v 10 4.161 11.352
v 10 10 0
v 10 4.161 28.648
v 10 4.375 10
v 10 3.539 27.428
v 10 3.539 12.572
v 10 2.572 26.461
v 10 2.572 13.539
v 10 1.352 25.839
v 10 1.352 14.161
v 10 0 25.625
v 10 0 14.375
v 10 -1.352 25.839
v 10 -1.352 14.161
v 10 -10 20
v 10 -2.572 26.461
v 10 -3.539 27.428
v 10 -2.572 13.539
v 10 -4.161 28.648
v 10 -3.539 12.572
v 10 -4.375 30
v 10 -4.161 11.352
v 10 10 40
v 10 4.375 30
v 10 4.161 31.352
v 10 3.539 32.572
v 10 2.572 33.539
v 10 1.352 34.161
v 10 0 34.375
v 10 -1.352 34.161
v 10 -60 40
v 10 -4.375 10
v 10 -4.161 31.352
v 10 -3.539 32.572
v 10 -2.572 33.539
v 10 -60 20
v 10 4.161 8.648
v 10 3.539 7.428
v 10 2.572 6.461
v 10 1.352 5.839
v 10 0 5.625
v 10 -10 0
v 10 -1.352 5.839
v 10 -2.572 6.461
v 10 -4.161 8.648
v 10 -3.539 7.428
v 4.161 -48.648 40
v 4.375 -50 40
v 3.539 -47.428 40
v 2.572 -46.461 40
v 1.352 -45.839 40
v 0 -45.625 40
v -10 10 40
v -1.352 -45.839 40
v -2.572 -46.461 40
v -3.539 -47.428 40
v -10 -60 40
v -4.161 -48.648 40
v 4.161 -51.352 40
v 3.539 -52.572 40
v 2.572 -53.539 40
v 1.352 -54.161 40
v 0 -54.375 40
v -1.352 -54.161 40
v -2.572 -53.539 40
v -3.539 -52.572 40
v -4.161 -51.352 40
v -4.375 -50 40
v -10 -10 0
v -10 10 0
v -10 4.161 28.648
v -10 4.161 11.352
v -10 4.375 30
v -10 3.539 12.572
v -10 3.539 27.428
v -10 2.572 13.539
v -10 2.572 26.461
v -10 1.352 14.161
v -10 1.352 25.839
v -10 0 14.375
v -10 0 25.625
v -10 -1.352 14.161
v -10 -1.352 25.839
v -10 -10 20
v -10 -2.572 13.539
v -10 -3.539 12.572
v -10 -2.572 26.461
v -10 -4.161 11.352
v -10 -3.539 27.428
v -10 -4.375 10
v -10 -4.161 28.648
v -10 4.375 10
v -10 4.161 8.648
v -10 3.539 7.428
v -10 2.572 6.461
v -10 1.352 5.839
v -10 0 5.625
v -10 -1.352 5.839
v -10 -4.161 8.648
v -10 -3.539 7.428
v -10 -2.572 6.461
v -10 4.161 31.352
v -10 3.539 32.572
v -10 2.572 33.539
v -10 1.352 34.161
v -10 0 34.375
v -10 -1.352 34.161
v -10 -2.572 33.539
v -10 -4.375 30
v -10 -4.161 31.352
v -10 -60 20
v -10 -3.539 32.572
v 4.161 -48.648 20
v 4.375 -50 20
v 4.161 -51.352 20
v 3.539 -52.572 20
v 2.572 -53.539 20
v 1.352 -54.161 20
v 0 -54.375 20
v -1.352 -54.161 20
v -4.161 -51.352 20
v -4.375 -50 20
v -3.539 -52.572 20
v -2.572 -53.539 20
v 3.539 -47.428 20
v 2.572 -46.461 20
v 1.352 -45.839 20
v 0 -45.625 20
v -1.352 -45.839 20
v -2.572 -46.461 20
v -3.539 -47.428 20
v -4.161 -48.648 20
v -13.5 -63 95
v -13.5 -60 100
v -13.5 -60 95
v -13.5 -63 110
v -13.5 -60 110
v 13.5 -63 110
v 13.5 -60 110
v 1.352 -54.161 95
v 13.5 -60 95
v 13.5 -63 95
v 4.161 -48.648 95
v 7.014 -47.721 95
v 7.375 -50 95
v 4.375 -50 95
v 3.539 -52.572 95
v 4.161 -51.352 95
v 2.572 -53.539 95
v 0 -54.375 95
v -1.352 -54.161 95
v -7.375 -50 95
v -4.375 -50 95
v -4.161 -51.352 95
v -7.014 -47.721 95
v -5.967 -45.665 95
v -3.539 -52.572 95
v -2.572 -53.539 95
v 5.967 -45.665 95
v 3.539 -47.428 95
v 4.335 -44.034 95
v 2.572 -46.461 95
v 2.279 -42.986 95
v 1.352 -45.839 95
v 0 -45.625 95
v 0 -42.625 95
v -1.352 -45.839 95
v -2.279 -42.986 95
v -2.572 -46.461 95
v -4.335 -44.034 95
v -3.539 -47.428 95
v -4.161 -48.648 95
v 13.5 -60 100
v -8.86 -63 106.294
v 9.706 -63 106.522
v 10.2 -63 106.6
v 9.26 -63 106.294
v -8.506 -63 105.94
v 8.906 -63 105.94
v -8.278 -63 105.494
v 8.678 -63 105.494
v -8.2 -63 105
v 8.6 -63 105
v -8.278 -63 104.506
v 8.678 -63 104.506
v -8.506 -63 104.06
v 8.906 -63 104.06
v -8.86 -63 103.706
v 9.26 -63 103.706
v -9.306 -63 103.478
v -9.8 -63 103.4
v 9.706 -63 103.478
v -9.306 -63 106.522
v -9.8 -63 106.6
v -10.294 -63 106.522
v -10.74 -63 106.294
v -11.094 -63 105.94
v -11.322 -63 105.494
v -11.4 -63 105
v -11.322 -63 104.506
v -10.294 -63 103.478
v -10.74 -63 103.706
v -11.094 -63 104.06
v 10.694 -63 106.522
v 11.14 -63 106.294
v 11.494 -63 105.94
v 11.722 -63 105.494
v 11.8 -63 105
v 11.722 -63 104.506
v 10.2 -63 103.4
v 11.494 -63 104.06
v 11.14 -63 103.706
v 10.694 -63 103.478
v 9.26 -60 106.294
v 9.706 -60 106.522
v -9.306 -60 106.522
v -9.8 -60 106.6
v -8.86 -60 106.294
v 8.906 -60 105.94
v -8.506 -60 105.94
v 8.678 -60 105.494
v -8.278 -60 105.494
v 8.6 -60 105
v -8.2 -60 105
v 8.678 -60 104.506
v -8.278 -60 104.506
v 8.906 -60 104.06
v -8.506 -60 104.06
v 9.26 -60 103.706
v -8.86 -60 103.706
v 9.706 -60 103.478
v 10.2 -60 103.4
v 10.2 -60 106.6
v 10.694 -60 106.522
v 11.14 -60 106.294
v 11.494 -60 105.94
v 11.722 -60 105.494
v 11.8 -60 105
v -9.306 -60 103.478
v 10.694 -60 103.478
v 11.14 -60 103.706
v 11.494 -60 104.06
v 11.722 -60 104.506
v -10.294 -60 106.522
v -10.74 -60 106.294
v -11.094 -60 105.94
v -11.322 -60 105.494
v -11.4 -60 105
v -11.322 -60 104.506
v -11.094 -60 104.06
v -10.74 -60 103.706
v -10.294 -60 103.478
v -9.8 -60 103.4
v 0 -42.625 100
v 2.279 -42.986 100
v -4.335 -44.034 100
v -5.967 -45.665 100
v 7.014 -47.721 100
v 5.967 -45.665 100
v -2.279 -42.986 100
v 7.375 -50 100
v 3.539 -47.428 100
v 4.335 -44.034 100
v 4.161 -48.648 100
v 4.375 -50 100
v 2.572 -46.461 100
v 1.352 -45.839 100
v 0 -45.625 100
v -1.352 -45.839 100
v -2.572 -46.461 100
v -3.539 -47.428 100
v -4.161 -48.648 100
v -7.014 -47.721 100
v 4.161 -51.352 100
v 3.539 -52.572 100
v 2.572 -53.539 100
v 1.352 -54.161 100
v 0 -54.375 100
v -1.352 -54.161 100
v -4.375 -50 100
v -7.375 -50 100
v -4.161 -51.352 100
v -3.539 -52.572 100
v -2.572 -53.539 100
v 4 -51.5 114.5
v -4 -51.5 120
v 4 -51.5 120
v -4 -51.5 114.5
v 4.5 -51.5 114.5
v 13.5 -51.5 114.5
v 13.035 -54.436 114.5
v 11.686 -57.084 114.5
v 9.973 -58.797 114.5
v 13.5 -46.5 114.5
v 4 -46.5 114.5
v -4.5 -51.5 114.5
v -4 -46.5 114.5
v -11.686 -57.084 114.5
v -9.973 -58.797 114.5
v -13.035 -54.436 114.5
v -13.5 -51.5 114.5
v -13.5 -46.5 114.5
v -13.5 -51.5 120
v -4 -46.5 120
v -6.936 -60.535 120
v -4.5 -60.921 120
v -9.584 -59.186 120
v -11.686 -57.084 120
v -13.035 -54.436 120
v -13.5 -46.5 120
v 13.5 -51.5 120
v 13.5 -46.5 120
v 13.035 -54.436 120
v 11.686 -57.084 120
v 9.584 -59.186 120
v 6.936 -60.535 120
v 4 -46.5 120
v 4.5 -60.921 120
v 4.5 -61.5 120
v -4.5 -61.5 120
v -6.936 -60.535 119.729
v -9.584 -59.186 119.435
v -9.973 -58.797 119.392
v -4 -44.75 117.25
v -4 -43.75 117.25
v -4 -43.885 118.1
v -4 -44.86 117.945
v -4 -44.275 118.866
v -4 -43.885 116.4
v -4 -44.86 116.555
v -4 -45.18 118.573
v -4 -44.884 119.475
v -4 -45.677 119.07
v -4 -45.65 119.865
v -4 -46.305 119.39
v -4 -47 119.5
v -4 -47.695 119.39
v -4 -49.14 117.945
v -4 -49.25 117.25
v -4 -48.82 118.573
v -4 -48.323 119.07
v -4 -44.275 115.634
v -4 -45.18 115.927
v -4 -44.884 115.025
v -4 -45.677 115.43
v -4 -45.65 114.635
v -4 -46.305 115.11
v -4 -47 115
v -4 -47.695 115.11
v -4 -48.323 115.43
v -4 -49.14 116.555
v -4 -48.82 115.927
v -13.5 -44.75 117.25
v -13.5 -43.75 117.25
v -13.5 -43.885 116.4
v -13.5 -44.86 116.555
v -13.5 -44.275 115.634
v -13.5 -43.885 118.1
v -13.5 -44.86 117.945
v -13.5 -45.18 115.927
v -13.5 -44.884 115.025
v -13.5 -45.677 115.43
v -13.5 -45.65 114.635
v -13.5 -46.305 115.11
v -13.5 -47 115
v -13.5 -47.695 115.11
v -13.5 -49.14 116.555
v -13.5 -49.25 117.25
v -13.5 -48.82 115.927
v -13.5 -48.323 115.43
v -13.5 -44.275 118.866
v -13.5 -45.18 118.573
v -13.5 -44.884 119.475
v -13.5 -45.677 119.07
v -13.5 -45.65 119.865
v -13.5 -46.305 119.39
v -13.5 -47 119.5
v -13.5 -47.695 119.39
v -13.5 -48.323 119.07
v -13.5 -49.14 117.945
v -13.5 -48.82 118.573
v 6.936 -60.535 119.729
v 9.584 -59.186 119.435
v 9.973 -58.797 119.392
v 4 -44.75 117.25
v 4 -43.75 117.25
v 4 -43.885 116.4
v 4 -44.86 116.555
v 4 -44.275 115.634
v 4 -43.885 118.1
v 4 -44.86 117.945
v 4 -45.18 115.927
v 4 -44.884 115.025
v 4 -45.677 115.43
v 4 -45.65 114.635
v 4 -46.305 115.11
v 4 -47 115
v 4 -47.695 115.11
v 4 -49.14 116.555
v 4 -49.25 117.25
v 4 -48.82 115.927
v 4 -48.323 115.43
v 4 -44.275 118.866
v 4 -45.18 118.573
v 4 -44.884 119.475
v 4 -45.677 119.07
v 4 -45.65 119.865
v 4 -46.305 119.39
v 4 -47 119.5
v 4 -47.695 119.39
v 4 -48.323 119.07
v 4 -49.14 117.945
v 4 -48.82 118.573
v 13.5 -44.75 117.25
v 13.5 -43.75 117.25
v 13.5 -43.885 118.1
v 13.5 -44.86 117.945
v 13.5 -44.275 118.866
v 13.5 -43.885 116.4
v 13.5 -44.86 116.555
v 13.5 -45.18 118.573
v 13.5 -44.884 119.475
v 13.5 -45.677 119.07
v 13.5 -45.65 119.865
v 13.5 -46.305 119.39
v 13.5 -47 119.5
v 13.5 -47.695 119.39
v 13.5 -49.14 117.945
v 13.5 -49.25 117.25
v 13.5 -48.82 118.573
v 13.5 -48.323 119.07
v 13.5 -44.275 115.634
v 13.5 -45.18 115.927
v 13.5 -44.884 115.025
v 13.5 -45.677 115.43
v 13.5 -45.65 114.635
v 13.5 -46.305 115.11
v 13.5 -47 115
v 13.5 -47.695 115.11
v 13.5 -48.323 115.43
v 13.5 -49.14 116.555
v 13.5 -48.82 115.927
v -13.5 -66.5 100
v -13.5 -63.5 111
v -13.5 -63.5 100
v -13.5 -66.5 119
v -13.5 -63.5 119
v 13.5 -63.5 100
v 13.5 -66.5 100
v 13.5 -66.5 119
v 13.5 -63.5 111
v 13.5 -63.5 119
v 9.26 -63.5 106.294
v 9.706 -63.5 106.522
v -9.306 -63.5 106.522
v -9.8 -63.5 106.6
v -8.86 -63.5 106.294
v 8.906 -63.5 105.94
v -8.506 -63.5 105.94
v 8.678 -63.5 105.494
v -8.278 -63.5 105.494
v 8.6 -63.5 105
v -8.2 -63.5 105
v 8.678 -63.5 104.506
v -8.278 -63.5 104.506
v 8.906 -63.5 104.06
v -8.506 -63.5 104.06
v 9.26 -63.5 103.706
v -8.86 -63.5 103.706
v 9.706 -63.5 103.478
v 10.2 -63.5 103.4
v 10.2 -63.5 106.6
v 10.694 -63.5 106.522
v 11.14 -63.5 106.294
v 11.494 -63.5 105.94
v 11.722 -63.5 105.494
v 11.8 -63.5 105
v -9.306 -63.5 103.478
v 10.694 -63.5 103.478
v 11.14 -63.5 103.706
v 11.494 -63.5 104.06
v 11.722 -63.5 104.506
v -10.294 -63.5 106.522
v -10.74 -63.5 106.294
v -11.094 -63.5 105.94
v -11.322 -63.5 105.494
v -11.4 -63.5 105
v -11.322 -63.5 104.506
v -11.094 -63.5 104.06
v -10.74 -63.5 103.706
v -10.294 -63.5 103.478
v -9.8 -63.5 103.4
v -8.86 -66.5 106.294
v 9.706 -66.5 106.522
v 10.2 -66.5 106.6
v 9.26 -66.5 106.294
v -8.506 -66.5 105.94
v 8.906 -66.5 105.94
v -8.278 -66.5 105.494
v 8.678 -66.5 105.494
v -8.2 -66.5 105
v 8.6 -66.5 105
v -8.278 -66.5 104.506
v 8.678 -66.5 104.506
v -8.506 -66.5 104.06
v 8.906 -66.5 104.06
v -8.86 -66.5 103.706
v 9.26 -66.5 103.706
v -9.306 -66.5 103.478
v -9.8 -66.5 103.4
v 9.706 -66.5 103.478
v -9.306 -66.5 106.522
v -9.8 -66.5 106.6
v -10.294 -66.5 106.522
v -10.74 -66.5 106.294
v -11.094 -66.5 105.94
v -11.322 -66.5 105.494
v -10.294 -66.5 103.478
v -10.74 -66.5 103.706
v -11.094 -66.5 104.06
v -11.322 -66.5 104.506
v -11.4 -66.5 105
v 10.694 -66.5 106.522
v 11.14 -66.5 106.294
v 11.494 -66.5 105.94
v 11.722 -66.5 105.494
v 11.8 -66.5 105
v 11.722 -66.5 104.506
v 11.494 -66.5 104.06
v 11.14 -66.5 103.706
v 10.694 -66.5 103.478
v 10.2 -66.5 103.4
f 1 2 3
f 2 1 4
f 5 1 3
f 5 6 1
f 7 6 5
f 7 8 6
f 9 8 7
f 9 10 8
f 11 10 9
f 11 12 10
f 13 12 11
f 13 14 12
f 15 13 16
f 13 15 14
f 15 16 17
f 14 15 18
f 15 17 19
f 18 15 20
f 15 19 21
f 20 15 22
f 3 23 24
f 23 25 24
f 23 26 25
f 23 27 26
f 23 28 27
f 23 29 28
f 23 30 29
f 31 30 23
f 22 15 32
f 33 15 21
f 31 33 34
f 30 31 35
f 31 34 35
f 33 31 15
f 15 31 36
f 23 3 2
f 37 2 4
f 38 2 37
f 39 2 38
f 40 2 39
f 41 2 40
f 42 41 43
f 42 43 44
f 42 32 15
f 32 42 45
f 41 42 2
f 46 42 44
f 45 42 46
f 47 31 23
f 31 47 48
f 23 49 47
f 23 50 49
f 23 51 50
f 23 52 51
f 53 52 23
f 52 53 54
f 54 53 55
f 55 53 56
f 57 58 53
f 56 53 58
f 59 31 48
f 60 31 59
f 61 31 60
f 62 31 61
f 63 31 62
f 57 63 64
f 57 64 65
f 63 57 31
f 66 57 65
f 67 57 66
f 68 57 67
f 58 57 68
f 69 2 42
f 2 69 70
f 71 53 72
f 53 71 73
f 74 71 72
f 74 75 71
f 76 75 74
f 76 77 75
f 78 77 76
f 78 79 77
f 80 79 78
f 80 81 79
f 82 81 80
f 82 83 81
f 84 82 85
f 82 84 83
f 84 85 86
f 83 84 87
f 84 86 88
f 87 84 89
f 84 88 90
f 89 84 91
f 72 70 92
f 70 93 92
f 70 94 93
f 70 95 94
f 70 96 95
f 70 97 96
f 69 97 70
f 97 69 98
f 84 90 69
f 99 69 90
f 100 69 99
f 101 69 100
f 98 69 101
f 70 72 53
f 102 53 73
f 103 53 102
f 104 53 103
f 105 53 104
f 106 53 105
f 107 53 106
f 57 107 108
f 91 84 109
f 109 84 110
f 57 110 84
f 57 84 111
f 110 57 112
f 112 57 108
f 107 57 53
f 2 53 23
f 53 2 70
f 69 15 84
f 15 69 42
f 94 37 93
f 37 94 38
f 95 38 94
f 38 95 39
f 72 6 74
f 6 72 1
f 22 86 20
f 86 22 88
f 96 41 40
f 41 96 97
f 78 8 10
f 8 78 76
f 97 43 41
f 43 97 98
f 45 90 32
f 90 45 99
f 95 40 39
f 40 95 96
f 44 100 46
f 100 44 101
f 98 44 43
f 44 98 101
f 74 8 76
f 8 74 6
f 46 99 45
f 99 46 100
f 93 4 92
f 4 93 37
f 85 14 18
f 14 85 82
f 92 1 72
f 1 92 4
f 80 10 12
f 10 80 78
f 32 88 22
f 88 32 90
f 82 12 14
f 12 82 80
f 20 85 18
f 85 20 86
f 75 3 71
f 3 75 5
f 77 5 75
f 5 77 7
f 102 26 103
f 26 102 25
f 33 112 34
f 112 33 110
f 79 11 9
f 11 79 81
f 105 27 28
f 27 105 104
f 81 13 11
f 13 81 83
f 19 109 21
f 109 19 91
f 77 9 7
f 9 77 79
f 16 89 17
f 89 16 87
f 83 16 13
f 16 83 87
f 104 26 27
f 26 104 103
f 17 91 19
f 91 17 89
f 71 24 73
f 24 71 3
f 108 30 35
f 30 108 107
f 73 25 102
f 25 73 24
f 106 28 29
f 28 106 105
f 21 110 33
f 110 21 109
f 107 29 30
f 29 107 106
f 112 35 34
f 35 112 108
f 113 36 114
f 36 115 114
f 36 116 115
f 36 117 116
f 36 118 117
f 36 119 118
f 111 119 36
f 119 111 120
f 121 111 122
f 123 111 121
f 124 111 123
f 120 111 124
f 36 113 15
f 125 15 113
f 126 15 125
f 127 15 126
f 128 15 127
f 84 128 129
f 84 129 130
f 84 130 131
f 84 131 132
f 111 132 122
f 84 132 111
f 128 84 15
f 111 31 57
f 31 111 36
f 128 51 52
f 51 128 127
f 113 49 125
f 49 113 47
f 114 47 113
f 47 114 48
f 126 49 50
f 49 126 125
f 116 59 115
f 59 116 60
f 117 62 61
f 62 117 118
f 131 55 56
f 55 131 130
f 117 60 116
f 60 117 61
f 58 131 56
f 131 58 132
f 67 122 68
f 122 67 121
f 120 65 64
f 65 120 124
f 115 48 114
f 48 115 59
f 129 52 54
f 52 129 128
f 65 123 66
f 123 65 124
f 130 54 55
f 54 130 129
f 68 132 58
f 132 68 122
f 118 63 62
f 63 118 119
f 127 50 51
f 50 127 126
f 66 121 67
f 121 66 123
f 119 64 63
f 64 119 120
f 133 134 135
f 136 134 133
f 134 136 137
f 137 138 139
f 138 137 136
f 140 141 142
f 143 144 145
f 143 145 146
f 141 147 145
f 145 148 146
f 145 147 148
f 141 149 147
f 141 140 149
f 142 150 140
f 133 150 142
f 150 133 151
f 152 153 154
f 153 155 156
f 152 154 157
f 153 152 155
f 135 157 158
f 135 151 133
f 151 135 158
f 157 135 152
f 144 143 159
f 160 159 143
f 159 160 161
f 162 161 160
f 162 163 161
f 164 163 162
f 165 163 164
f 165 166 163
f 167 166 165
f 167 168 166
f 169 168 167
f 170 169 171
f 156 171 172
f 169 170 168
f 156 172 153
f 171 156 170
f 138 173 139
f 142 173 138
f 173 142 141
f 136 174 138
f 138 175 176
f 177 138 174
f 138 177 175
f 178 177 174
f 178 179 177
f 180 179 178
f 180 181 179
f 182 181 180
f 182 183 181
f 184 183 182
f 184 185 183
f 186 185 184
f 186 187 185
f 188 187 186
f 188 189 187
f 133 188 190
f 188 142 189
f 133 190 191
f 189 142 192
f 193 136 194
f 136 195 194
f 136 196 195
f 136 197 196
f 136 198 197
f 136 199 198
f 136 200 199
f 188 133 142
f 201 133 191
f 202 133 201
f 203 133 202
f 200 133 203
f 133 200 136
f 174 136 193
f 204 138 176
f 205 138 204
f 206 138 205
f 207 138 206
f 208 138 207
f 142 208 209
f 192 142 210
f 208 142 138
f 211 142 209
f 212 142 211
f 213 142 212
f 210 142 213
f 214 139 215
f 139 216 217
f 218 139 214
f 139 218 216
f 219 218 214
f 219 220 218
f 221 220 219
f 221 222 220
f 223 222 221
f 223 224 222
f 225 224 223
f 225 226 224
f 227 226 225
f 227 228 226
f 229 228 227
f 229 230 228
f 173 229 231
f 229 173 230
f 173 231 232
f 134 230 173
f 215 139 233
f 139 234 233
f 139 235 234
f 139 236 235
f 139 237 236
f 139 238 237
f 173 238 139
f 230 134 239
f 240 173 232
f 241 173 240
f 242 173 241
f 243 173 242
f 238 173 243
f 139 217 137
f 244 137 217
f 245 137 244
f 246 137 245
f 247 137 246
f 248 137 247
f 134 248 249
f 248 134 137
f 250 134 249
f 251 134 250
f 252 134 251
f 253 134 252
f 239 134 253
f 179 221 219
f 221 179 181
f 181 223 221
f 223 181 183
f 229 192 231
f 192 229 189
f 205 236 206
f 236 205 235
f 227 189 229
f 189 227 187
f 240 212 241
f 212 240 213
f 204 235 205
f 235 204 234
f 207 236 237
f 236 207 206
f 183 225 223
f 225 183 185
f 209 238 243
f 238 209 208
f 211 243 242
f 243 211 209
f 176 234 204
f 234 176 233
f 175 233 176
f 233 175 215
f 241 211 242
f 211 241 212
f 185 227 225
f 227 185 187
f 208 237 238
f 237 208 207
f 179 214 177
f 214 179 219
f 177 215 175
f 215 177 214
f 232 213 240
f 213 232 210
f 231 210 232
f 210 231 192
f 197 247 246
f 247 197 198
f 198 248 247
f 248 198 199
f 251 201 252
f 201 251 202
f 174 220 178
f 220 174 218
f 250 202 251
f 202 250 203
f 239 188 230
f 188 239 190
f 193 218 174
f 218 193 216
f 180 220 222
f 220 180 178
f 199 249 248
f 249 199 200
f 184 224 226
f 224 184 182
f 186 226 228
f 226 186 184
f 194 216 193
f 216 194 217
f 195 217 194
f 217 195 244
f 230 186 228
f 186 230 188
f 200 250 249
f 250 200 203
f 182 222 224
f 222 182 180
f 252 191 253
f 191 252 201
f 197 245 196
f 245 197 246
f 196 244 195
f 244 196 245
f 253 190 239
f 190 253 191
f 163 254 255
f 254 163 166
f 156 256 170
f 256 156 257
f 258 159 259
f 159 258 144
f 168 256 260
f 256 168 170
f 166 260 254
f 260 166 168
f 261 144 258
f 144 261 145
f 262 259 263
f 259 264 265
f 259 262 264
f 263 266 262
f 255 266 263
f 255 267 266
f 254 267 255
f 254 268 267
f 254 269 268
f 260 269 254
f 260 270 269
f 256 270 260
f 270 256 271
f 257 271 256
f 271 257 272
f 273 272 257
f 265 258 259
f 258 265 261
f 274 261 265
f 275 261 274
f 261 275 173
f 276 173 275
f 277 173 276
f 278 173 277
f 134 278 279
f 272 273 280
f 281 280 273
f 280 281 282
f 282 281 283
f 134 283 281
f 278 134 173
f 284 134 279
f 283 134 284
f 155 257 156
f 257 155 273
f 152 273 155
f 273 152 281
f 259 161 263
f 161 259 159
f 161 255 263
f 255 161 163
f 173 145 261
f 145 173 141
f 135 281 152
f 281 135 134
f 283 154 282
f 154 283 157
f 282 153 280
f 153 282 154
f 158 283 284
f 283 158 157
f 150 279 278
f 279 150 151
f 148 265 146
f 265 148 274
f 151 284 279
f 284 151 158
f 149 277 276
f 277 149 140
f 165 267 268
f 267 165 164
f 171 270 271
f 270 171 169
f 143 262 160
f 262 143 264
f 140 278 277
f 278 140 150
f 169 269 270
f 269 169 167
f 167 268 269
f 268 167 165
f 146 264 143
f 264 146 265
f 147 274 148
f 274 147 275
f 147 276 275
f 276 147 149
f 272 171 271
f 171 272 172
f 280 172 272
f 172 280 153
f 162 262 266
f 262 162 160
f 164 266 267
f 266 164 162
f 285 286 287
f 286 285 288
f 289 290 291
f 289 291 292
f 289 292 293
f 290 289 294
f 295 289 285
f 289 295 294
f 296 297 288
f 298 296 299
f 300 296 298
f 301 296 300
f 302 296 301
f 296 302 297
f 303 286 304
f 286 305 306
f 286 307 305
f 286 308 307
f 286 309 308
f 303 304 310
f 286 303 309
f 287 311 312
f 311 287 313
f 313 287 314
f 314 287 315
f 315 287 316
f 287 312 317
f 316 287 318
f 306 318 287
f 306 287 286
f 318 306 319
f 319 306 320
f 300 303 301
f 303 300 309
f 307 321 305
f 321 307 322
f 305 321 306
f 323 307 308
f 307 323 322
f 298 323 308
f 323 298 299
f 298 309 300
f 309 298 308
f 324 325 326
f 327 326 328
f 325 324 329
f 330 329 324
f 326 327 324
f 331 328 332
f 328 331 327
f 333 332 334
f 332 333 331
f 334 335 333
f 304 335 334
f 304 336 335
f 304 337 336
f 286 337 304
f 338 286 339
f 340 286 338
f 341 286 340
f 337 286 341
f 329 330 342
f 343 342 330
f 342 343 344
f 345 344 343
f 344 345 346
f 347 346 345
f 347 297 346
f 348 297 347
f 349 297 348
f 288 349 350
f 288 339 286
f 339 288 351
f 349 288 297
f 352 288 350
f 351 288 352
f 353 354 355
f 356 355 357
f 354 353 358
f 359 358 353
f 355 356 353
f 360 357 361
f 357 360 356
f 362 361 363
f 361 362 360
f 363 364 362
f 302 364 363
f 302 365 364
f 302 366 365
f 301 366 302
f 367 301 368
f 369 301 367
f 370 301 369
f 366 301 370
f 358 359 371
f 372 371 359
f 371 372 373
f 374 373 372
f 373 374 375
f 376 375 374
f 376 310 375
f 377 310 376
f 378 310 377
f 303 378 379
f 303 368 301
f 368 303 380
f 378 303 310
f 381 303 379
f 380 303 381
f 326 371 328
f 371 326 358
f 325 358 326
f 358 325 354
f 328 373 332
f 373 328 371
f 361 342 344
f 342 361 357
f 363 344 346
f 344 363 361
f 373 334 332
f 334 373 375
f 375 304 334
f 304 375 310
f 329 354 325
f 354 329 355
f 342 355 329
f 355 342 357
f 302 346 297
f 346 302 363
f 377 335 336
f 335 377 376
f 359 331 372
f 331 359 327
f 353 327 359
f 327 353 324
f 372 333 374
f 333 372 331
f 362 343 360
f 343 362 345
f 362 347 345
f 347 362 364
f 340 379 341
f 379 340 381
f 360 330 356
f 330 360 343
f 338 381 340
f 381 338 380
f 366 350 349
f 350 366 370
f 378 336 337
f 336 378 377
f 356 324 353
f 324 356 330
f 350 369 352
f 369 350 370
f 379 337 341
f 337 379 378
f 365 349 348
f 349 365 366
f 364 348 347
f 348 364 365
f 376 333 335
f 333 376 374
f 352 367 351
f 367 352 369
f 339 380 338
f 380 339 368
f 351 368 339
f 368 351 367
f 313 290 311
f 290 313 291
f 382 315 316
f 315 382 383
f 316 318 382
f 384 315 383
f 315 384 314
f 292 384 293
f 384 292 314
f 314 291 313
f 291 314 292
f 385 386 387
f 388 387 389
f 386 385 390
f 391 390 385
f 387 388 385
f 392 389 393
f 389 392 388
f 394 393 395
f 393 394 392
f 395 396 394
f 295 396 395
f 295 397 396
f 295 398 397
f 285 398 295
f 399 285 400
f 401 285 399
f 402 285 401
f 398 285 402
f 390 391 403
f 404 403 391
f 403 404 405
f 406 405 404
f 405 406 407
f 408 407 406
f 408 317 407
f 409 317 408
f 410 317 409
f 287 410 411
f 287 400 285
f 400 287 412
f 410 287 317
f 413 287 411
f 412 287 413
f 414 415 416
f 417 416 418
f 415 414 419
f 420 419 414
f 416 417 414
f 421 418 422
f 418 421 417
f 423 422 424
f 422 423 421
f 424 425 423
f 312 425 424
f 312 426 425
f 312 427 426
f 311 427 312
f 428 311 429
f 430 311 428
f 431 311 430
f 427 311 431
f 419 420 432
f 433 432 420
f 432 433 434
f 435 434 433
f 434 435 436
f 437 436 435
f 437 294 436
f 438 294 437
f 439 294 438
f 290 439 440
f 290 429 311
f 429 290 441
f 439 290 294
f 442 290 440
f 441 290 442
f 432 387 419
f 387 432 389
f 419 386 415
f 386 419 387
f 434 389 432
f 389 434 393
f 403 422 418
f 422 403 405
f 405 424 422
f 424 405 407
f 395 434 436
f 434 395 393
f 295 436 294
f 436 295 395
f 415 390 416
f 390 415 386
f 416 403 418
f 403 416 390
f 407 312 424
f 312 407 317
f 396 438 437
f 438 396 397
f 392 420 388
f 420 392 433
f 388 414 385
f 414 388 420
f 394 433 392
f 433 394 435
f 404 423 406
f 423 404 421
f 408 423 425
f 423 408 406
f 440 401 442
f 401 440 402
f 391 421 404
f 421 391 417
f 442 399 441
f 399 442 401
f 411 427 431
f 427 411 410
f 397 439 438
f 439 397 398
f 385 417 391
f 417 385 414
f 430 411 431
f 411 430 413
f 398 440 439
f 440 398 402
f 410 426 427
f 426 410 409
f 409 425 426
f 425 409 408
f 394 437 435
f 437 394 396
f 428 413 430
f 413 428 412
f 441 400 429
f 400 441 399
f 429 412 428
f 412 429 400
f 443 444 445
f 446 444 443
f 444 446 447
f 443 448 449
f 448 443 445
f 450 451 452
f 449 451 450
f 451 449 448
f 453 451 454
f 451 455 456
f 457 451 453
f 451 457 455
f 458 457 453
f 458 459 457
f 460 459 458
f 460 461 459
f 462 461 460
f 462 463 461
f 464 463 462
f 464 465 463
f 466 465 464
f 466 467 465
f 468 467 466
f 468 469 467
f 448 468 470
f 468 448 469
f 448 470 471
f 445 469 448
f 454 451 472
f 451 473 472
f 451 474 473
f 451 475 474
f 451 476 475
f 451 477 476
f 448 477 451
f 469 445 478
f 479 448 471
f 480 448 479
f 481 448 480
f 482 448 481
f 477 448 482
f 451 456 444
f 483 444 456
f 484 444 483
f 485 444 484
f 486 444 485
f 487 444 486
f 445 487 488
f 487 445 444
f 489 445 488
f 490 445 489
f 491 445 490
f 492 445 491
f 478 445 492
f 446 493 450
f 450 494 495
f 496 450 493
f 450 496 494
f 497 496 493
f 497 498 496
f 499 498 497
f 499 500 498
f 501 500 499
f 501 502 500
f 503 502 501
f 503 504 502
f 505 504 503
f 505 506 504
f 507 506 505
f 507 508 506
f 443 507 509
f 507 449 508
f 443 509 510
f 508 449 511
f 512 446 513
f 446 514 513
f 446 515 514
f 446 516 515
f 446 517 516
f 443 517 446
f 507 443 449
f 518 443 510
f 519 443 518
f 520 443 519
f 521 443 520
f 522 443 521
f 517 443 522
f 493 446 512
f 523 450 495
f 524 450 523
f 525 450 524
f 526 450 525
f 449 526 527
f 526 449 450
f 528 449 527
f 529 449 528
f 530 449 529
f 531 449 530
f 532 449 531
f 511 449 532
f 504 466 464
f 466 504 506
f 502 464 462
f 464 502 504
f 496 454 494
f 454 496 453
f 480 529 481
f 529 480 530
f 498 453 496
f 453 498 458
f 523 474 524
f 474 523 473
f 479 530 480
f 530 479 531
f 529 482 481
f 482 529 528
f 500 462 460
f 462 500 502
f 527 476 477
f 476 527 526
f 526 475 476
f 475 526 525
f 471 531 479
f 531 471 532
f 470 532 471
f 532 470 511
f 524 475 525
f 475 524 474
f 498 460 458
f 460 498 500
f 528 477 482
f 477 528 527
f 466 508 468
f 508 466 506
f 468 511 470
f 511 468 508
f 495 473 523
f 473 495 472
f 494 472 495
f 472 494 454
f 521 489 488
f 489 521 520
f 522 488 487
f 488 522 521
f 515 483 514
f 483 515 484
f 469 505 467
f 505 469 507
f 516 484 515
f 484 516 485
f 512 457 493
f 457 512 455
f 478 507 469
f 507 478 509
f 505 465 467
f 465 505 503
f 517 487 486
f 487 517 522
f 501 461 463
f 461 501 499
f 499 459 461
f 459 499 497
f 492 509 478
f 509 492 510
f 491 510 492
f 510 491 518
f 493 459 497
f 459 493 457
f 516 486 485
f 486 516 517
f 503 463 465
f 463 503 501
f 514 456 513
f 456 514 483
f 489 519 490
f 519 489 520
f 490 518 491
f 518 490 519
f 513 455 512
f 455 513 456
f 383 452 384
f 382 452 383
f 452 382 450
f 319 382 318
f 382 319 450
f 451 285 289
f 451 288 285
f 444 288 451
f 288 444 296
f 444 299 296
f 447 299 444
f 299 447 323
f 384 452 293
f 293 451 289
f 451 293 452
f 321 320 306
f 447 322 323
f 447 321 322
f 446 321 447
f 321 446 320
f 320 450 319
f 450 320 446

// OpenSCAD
// file: ../Webcam Holder/cam_bracket.scad
/*
 * Inspired by the "TinyBoy / Fabrikator mini Cam holder"
 * by "andy_a":
 * http://www.thingiverse.com/thing:1434698
 *
 * Created by:
 * Thomas Buck <xythobuz@xythobuz.de> in April 2016
 *
 * Licensed under the Creative Commons - Attribution - Share alike license.
 */

//import("/Users/thomas/Downloads/TinyBoy___Fabrikator_mini_Cam_holder/files/tinyboy__fabrikator_mini_cam_holder.stl");

// -----------------------------------------------------------

$fn = 20;

// -----------------------------------------------------------

module quarter_circle(d, h) {
    difference() {
        cylinder(d = d, h = h);
        
        translate([0, -(d / 2) - 1, -1])
            cube([(d / 2) + 1, d + 2, h + 2]);
        
        translate([-(d / 2) - 1, 0, -1])
            cube([(d / 2) + 2, (d / 2) + 1, h + 2]);
    }
}

module webcam_shaft_center() {
    difference() {
        cube([9.5, 3.5, 8]);
        
        translate([4.5, 4, 4])
            rotate([90, 0, 0])
            cylinder(d = 3, h = 4.5);
    }
}

module webcam_shaft_end() {
    difference() {
        union() {
            // rectangular part
            translate([0, -5.5, 0])
                cube([5, 5.5, 9.5]);
            
            // front radius
            translate([5, -2.75, 0])
                cylinder(d = 5.5, h = 9.5);
            
            translate([0, 0, 9.5])
                rotate([90, 0, 0])
                quarter_circle(19, 5.5);
        }
    
        // axis hole
        translate([4.5, -2.75, -1])
            cylinder(d = 4.5, h = 11.5);
    }
}

module webcam_shaft() {
    translate([-0.5, -5.5, 9.5])
        webcam_shaft_center();

    translate([9, 0, 0])
        webcam_shaft_end();

    translate([9, -5.5, 27])
        rotate([0, 180, 180])
        webcam_shaft_end();
}

// -----------------------------------------------------------

translate([0, 0.5, 5.5])
    rotate([90, 0, 90])
    webcam_shaft();
// file: cam-holder.scad
//import("/Users/thomas/Downloads/y-corner.stl");

// holder
edge = 20;
height = 40;
hole_off = 10;
hole_size = 8.0;
hole_wiggle = 0.75;

// adaptor
length = 50;
forw_height = 20;

// cam
cam_width = 27.0;
cam_height = 5.0;
cam_wall = 3.0;
cam_holes = 3.2;
cam_hole_off = 3.3;
cam_hole_dist = 20.0;
cam_mount_height = 15.0;
cam_mount_dist = 10.0;

mock_pole_height = 60.0 + 40;
mock_pole_off = 10.0;

$fn = 20;

module prism(l, w, h) {
    #polyhedron(
        points = [[0,0,0], [l,0,0], [l,w,0], [0,w,0], [0,w,h], [l,w,h]],
        faces = [[0,1,2,3],[5,4,3,2],[0,4,5,1],[0,3,4],[5,2,1]]
    );
}

module holder() {
    difference() {
        translate([-edge / 2, -edge / 2, 0])
            cube([edge, edge, height]);
        
        translate([-edge / 2 - 1, 0, hole_off])
            rotate([0, 90, 0])
            cylinder(d = hole_size + hole_wiggle, h = edge + 2);
        
        translate([-edge / 2 - 1, 0, height - hole_off])
            rotate([0, 90, 0])
            cylinder(d = hole_size + hole_wiggle, h = edge + 2);
    }
}

module adaptor() {
    translate([-edge / 2, -edge / 2 - length, height - forw_height])
    difference() {
        cube([edge, length, forw_height]);
        
        translate([edge / 2, hole_off, -1])
            cylinder(d = hole_size + hole_wiggle, h = forw_height + 2);
    }
}

module cam_plate() {
    difference() {
        cube([cam_width, cam_wall, cam_mount_height]);
        
        translate([cam_hole_off, cam_wall + 1, cam_mount_height - cam_height])
            rotate([90, 0, 0])
            cylinder(d = cam_holes, h = cam_wall + 2);
        
        translate([cam_hole_off + cam_hole_dist, cam_wall + 1, cam_mount_height - cam_height])
            rotate([90, 0, 0])
            cylinder(d = cam_holes, h = cam_wall + 2);
    }
}

module cam_mount() {
    translate([0, -edge / 2 - length + hole_off, height - forw_height + mock_pole_height - mock_pole_off * 2 - 40])
    rotate([0, 0, 180])
    difference() {
        union() {
            cylinder(d = hole_size + hole_wiggle + cam_wall * 2, h = cam_height);
            
            translate([-cam_width / 2, cam_mount_dist, 0])
                cam_plate();
            
            translate([-cam_width / 2 + cam_width / 2 - ((hole_size + hole_wiggle) / 2 + cam_wall), 0, 0])
                cube([cam_width - 2 * (cam_width / 2 - ((hole_size + hole_wiggle) / 2 + cam_wall)), cam_mount_dist + ((hole_size + hole_wiggle) / 2) - 2, cam_height]);
            
            translate([-(hole_size + hole_wiggle) / 2 - cam_wall, 0, 0])
                rotate([0, -90, 0])
                prism(cam_height, cam_mount_dist, cam_width / 2 - ((hole_size + hole_wiggle) / 2 + cam_wall));
            
            translate([(hole_size + hole_wiggle) / 2 + cam_wall, 0, cam_height])
                rotate([0, 90, 0])
                prism(cam_height, cam_mount_dist, cam_width / 2 - ((hole_size + hole_wiggle) / 2 + cam_wall));
        }
        
        translate([0, 0, -1])
            cylinder(d = hole_size + hole_wiggle, h = cam_height + 2);
    }
}

module cam_holder_mount() {
    holder();
    adaptor();

    %translate([0, -edge / 2 - length + hole_off, height - forw_height - mock_pole_off])
        cylinder(d = hole_size, h = mock_pole_height);

    translate([0, 0, 35])
    cam_mount();
}

cam_holder_mount();
// main file
light_height = 8;
light_wall = 3;
light_wall_add = 2;
light_dia = 150;
light_cut = 20;
lights_off = 5.8;

light_h = light_height + (2 * light_wall_add);

module lights_ring() {
    $fn = 50;
    translate([0, light_dia / 2, 0])
    difference() {
        cylinder(h = light_h, d = light_dia);
        
        translate([0, 0, -1])
            cylinder(h = light_h + 2, d = light_dia - light_wall - light_wall_add);
        
        translate([0, 0, light_wall_add])
            cylinder(h = light_height, d = light_dia - light_wall);
        
        translate([-light_dia / 2, -light_dia / 2 + light_cut, -1])
            cube([light_dia, light_dia, light_h + 2]);
    }
}

module lights_mount() {
    translate([0, -edge / 2 - length + hole_off, height - forw_height + mock_pole_height - mock_pole_off * 2 - 10])
    difference() {
        union() {
            cylinder(d = hole_size + hole_wiggle + cam_wall * 2, h = light_h);
            
            translate([0, lights_off, 0])
                lights_ring();
        }
        
        translate([0, 0, -1])
            cylinder(d = hole_size + hole_wiggle, h = light_h + 2);
    }
}

include <cam-holder.scad>
use <../Webcam Holder/cam_bracket.scad>

module fab_min_mount() {
    translate([-13.5, -60.5, 120])
    union() {
        rotate([90, 0, 90])
        webcam_shaft();
    
        translate([27, -6, -5])
        rotate([0, 180, 0])
        cam_plate();
    
        hull() {
            translate([0, -6, -9])
            cube([27, 3, 8]);
            translate([9, -1, -5.5])
            cube([9, 10, 5.5]);
        }
    }
}

//translate([0, 0, -15])
//lights_mount();

// for use with orangepi cam you just need this
//cam_holder_mount();

// orangepi cam
//use <opi-cam-mount.scad>
//color("white")
//%translate([13, -37, 75])
//    rotate([90, 0, 180])
//    cam_holder();

// Fabrikator Mini Cam Holder
fab_min_mount();
